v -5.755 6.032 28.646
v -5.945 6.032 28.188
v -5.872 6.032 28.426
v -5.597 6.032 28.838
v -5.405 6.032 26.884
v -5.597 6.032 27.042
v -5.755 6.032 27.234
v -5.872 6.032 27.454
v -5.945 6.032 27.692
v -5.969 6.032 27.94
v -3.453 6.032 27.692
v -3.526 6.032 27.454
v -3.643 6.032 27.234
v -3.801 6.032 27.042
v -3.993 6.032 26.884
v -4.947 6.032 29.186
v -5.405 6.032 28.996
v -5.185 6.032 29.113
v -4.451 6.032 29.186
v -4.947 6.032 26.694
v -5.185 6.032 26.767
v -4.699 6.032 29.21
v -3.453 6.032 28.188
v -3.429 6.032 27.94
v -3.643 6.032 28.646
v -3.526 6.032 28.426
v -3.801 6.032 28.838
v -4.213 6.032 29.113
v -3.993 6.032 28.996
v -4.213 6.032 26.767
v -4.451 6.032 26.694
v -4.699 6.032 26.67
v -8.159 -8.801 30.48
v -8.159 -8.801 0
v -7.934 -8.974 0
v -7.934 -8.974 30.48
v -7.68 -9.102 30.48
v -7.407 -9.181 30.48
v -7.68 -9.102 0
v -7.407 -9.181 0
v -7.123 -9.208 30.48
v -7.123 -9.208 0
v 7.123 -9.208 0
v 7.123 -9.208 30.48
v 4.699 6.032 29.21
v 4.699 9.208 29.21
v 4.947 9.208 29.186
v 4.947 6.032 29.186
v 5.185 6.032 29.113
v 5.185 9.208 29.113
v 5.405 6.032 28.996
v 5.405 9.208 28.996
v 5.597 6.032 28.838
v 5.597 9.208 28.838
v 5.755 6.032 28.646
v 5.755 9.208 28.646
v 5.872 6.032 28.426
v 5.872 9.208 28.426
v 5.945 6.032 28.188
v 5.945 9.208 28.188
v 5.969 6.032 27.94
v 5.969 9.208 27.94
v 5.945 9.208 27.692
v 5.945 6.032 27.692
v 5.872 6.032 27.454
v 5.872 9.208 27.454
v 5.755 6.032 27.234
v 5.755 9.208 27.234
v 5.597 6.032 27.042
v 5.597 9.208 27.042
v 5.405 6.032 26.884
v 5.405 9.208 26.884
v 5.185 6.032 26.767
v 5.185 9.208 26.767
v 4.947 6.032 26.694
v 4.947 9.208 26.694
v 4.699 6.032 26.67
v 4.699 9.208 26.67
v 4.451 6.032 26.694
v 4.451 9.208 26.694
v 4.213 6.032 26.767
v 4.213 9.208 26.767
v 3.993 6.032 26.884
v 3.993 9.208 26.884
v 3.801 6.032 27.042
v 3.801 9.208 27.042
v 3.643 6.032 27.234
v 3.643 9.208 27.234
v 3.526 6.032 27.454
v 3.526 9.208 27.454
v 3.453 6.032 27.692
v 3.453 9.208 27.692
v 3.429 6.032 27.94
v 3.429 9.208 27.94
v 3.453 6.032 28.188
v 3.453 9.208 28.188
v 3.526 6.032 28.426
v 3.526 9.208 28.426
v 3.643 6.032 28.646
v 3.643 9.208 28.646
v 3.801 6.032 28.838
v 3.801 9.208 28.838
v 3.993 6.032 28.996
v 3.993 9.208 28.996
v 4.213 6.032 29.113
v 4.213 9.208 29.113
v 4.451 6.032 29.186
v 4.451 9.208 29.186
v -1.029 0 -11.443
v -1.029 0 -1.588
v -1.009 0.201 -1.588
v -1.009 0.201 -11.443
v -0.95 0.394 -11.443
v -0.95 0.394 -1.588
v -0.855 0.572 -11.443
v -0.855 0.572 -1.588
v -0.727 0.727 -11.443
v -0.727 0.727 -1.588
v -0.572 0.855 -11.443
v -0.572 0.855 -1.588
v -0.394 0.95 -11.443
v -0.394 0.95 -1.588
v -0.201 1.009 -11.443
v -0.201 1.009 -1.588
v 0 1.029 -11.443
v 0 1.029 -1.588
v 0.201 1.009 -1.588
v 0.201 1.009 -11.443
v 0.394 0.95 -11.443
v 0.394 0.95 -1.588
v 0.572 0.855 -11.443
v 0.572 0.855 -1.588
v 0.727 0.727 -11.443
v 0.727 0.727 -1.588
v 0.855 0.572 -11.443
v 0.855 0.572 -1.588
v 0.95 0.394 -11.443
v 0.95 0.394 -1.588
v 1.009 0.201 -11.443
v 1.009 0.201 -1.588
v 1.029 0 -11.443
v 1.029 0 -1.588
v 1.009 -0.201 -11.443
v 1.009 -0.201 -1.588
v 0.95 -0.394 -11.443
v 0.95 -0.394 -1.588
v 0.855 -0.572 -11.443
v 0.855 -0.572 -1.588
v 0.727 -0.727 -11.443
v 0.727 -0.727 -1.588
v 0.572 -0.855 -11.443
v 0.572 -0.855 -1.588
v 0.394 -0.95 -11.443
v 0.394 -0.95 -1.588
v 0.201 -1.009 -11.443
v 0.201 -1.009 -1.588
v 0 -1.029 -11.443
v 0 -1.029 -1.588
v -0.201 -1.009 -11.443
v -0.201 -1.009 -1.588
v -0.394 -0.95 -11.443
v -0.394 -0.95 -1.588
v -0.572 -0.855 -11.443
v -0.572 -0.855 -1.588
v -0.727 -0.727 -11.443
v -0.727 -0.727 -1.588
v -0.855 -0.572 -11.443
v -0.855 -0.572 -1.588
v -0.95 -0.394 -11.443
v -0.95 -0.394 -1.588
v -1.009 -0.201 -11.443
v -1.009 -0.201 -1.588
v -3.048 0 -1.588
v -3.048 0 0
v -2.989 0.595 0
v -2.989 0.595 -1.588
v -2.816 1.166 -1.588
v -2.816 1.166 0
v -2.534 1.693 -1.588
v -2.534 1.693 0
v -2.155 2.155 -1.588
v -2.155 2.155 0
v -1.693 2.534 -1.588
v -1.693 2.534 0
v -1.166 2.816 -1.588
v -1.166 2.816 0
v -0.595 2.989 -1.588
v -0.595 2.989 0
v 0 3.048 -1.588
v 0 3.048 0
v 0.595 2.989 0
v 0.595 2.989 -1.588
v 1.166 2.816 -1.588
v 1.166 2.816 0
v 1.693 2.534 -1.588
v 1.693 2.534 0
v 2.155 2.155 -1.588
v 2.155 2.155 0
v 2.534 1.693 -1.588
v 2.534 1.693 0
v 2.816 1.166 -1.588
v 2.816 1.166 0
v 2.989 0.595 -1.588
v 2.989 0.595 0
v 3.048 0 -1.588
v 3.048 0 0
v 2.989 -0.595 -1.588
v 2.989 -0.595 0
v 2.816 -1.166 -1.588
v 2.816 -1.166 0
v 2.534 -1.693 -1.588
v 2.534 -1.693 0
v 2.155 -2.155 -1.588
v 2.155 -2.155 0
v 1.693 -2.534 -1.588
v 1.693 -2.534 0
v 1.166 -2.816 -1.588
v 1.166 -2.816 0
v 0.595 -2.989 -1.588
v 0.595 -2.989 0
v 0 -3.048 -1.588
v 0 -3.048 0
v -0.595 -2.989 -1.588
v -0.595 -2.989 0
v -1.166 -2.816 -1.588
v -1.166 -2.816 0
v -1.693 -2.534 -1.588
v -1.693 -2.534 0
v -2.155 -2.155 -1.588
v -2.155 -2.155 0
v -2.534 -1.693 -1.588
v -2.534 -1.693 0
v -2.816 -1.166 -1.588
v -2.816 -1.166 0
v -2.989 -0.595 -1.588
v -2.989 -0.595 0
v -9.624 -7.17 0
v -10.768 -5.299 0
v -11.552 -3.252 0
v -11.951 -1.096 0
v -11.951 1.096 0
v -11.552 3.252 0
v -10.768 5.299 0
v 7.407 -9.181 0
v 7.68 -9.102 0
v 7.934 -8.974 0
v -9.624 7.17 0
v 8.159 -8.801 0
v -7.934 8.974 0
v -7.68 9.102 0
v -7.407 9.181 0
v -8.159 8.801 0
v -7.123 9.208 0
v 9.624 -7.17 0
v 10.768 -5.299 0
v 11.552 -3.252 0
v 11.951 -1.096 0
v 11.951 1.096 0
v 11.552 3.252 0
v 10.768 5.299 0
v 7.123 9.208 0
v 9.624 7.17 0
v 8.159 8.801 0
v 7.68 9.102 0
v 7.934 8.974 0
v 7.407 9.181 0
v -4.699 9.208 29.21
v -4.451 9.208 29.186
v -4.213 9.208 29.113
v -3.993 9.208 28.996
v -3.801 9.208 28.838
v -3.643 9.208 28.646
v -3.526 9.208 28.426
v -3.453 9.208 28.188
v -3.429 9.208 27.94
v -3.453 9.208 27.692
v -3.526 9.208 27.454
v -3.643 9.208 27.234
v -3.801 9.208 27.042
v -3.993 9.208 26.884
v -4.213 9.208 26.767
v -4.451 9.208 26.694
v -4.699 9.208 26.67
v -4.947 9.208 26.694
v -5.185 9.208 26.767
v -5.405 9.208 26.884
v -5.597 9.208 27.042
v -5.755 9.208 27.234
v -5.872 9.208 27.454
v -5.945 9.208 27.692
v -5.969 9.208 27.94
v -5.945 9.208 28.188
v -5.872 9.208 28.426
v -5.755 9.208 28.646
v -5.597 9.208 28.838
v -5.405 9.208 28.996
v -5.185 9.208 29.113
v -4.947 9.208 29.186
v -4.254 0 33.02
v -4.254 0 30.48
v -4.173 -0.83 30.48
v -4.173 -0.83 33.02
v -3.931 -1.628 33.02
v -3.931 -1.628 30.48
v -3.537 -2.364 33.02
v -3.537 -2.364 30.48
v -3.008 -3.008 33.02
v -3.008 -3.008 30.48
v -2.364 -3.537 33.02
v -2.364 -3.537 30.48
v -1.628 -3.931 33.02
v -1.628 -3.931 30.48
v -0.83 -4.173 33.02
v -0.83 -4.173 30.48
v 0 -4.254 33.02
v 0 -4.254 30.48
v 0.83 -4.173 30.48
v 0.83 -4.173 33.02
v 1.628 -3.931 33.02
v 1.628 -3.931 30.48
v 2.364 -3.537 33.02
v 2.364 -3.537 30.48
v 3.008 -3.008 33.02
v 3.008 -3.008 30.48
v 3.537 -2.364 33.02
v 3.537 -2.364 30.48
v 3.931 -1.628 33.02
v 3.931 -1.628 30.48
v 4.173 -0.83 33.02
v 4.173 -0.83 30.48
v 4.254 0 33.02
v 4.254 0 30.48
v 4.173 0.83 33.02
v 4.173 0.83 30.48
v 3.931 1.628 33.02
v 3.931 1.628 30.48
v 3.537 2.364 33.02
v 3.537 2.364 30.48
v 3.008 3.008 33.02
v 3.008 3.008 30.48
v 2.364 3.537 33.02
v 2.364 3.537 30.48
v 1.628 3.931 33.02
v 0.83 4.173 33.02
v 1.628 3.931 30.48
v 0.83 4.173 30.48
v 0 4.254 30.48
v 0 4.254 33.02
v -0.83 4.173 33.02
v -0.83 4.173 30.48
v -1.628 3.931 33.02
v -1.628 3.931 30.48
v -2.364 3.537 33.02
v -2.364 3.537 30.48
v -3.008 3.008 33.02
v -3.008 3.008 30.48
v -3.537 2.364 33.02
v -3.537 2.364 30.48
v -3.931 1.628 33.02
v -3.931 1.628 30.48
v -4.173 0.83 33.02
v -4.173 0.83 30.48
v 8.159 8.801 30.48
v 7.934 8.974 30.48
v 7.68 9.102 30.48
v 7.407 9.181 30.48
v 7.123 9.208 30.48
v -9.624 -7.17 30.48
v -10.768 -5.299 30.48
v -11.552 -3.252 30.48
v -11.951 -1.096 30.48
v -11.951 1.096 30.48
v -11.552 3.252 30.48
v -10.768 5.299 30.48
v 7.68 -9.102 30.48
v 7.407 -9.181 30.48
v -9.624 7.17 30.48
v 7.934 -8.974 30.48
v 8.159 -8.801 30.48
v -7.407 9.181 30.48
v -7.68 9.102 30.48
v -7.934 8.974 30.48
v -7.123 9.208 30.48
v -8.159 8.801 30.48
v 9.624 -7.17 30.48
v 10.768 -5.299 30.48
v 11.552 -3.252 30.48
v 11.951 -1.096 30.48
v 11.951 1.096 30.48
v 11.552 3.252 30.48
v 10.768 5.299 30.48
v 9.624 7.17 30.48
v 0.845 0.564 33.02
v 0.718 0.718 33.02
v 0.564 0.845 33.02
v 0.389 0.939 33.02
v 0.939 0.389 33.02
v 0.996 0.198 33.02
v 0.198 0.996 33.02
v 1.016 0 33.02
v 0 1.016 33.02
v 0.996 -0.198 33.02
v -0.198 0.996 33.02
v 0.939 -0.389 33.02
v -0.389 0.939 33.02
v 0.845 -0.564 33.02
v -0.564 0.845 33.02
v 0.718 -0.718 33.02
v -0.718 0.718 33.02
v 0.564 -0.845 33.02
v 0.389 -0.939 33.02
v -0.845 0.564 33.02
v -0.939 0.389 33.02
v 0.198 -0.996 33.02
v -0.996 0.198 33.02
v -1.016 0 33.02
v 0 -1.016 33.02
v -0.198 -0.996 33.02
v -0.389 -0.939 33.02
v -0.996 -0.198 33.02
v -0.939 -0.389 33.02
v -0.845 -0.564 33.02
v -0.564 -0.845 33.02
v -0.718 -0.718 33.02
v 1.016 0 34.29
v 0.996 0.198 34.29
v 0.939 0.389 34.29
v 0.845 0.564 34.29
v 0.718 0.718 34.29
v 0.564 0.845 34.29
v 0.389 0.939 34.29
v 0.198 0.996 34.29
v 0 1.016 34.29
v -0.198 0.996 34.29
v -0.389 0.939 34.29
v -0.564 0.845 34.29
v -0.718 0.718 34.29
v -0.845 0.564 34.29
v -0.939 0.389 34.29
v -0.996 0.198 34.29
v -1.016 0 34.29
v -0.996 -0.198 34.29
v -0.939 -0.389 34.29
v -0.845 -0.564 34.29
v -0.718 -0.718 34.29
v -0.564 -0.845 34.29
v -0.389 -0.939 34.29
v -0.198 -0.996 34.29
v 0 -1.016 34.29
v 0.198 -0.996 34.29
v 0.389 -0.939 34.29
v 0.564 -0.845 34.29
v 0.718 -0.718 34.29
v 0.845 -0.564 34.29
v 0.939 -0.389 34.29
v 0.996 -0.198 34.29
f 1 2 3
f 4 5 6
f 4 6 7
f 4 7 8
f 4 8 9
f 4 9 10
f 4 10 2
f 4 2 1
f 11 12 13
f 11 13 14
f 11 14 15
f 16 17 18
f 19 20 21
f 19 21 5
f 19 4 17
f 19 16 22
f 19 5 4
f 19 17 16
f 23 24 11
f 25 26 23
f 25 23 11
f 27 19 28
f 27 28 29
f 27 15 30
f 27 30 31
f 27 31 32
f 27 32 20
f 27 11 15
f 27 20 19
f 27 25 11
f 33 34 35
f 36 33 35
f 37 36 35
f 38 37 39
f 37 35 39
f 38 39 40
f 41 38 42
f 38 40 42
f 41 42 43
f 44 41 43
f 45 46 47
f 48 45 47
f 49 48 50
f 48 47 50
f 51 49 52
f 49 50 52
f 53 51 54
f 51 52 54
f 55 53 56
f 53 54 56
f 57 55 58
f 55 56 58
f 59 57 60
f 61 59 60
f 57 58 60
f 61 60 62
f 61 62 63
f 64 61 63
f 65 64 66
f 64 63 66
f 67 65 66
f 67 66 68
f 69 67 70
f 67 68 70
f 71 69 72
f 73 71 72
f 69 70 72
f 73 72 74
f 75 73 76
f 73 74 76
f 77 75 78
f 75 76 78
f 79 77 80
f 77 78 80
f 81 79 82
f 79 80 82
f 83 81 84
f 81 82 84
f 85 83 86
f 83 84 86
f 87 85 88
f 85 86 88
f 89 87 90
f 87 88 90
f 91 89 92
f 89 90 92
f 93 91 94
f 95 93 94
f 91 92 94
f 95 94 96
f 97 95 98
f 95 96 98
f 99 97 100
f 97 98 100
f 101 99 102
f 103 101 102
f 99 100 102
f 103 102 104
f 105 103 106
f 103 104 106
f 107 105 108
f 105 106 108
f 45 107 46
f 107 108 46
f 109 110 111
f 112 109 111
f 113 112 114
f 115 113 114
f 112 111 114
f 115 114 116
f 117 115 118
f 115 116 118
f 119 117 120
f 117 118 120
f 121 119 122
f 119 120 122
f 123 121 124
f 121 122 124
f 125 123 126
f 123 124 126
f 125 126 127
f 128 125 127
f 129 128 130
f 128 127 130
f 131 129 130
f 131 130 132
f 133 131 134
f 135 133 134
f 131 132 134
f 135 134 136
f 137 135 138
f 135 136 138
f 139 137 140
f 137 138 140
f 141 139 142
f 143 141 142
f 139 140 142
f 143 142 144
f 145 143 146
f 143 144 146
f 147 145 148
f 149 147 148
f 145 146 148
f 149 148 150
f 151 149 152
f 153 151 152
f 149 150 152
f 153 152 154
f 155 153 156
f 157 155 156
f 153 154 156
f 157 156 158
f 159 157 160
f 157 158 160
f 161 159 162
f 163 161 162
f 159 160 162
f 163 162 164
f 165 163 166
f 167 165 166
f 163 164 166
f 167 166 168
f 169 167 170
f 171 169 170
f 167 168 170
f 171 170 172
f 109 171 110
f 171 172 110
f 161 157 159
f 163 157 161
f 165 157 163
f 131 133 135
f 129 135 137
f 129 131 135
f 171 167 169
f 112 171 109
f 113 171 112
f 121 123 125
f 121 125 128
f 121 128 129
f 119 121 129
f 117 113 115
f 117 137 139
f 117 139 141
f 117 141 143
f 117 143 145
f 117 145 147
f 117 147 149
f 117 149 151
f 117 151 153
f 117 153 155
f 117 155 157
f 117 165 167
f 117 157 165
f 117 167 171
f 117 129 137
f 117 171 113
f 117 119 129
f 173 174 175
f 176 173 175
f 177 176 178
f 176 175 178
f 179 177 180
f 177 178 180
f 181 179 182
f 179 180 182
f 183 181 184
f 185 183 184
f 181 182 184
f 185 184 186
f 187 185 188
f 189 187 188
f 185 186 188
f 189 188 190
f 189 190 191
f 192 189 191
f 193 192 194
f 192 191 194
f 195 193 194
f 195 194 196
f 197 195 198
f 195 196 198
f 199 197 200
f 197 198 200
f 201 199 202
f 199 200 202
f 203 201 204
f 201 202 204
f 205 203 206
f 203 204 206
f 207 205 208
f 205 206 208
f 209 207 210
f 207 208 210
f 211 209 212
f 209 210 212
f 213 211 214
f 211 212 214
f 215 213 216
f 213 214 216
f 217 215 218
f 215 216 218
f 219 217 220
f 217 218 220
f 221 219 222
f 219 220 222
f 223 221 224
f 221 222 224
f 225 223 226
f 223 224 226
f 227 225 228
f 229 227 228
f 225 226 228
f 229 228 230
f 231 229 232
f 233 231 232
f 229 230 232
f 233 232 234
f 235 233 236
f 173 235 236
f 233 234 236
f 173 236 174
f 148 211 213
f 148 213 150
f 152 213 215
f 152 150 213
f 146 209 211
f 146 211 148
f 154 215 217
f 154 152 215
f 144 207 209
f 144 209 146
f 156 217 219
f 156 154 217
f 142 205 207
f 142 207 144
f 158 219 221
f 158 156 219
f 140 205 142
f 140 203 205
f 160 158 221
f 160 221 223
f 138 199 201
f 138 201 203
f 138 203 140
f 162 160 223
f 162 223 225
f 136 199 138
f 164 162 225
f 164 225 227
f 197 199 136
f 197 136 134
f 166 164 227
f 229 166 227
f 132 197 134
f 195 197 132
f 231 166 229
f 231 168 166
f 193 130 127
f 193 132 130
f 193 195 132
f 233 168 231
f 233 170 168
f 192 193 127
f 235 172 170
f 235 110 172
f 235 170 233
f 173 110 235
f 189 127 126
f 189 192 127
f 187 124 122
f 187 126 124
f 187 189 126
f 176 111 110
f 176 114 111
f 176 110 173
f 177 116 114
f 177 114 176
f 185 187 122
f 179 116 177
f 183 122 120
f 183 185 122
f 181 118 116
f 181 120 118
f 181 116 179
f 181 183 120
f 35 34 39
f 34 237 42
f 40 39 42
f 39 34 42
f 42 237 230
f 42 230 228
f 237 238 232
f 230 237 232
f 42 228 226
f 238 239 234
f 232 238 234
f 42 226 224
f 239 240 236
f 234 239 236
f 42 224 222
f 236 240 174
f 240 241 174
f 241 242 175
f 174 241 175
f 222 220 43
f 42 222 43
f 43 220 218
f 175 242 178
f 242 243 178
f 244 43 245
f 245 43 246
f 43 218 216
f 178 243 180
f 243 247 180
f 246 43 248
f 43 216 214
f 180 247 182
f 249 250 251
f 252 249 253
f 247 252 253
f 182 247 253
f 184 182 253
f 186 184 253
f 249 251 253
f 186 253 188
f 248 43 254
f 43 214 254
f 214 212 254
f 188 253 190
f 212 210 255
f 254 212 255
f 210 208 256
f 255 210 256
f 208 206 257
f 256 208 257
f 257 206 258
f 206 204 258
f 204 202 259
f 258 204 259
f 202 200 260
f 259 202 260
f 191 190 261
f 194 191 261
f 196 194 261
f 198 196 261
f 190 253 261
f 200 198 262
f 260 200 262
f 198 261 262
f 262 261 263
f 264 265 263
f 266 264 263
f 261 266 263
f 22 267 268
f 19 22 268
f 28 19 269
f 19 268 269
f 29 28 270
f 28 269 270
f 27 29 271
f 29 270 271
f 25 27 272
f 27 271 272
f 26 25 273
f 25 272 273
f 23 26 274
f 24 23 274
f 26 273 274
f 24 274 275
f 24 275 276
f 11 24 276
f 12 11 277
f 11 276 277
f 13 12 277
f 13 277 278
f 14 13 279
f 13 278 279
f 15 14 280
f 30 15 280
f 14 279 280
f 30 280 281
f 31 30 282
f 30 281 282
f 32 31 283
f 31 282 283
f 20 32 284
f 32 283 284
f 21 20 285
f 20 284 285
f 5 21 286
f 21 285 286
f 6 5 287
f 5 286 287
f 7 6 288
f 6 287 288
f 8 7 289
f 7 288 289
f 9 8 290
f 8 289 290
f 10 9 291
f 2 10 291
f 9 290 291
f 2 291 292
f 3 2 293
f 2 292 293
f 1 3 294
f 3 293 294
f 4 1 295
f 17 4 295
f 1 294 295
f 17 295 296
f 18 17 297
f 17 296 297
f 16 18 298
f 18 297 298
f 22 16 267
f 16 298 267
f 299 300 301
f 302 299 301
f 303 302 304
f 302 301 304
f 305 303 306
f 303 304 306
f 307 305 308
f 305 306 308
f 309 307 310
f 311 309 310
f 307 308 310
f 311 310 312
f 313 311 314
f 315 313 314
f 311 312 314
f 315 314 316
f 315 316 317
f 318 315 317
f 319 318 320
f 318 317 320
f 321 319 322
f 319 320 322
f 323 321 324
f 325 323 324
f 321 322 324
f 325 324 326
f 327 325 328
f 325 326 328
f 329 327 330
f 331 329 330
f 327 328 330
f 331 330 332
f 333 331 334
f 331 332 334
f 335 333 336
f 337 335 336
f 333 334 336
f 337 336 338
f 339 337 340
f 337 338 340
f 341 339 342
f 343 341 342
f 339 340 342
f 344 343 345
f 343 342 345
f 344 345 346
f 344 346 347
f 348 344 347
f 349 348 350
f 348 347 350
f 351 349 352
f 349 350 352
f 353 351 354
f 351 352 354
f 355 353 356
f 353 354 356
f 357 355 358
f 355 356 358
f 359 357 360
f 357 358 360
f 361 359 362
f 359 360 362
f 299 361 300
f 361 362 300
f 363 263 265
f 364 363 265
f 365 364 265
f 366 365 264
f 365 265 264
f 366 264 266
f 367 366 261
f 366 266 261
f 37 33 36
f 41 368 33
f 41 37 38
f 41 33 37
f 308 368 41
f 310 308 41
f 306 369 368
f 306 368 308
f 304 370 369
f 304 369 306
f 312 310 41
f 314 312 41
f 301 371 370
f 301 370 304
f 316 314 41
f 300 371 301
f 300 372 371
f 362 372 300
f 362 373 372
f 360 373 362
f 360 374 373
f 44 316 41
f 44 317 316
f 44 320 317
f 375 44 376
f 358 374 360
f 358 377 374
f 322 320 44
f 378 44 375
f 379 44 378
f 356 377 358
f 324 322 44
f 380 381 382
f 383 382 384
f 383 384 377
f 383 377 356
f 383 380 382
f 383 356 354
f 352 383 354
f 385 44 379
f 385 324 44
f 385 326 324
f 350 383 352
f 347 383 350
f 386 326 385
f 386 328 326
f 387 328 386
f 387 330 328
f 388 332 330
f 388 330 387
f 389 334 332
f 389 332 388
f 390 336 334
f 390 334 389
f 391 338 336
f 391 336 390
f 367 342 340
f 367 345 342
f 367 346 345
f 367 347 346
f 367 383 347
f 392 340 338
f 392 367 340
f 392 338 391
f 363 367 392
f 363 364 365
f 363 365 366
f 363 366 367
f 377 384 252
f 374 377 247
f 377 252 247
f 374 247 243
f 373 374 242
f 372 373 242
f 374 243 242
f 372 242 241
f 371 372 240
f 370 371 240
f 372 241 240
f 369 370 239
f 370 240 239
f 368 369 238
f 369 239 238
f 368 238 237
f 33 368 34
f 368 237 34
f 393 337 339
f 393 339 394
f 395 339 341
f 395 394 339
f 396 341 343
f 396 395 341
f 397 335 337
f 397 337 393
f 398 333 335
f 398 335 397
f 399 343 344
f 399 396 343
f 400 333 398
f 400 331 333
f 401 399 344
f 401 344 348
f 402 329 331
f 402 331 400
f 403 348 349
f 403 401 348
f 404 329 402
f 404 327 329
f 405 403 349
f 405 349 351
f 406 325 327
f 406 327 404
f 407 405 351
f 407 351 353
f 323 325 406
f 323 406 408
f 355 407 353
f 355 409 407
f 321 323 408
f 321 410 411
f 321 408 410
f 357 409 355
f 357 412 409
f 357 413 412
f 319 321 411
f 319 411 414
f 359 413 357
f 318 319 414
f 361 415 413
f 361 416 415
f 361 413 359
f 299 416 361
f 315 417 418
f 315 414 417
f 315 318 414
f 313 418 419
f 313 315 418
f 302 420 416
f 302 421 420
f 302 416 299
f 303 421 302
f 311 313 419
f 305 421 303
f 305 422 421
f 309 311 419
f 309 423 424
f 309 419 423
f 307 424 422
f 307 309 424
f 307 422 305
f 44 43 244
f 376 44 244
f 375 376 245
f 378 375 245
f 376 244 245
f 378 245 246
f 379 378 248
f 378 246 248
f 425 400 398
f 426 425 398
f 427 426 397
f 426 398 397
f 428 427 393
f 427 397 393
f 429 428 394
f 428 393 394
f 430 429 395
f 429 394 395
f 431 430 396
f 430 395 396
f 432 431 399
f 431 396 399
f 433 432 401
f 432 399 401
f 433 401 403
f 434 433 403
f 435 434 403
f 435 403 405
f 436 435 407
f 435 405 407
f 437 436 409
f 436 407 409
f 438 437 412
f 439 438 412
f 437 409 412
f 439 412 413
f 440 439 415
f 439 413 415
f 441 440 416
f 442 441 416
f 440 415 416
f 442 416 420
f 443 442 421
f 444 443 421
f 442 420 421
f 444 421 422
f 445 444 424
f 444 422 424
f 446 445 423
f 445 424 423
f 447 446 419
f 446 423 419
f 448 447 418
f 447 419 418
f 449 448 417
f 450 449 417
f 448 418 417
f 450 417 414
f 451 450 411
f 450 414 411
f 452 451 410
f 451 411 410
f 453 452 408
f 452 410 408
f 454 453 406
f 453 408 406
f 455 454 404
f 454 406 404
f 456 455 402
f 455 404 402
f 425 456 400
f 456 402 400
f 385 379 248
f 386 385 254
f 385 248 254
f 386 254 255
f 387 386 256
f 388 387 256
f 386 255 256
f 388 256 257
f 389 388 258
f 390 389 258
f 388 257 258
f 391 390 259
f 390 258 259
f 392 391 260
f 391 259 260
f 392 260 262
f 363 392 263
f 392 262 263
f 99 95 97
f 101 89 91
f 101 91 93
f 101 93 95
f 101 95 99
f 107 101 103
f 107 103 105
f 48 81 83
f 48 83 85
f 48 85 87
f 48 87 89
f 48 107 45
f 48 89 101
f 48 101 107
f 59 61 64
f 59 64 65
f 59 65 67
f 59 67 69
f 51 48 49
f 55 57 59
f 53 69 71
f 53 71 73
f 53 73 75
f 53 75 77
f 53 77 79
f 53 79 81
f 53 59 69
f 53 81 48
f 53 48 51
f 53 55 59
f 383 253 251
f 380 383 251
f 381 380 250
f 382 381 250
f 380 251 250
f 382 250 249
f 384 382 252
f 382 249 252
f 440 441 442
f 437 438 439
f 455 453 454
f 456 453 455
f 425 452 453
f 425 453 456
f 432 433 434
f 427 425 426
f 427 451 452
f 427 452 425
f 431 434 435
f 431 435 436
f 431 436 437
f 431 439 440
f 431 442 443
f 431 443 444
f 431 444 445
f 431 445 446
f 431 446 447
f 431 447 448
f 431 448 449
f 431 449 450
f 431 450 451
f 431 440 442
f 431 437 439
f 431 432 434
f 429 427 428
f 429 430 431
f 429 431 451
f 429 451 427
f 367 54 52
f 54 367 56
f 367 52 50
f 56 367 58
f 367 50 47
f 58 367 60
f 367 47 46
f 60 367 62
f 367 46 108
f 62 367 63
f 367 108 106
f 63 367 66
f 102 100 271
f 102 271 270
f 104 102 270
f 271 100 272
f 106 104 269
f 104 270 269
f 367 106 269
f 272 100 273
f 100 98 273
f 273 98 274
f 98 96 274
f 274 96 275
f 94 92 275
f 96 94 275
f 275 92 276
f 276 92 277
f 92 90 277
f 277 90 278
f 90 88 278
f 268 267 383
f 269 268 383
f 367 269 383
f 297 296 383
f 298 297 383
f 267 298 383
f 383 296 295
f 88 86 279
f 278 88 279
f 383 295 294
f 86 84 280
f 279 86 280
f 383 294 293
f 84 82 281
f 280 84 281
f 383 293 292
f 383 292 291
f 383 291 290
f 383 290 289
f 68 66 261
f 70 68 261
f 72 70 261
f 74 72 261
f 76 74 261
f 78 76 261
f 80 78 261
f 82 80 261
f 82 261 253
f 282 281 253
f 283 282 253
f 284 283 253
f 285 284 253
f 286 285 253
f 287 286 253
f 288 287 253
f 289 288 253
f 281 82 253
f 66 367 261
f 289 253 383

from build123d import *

# Parameters (mm, degrees)
BOSS_EXTRUDE1_DEPTH = 30.48
SKETCH2_R           = 4.2545
BOSS_EXTRUDE2_DEPTH = 2.54
SKETCH3_R           = 1.016
BOSS_EXTRUDE3_DEPTH = 1.27
SKETCH4_R           = 3.048
BOSS_EXTRUDE4_DEPTH = 1.5875
SKETCH5_R           = 1.0287
BOSS_EXTRUDE5_DEPTH = 9.8552
SKETCH6_R           = 1.27
CUT_EXTRUDE1_DEPTH  = 3.175


with BuildPart() as part:
    # Sketch1 → Boss-Extrude1 (new body)
    with BuildSketch(Plane.XY):
        with BuildLine():
            Line((-7.12333026, -9.2075), (7.12333026, -9.2075))
            ThreePointArc((7.12333026, -9.2075), (7.679816379, -9.102266788), (8.159451026, -8.8011))
            ThreePointArc((8.159451026, -8.8011), (12.0015, 0), (8.159451026, 8.8011))
            ThreePointArc((8.159451026, 8.8011), (7.679816379, 9.102266788), (7.12333026, 9.2075))
            Line((7.12333026, 9.2075), (-7.12333026, 9.2075))
            ThreePointArc((-7.12333026, 9.2075), (-7.679816379, 9.102266788), (-8.159451026, 8.8011))
            ThreePointArc((-8.159451026, 8.8011), (-12.0015, 0), (-8.159451026, -8.8011))
            ThreePointArc((-8.159451026, -8.8011), (-7.679816379, -9.102266788), (-7.12333026, -9.2075))
        make_face()
    extrude(amount=BOSS_EXTRUDE1_DEPTH)

    # Sketch2 → Boss-Extrude2 (add)
    with BuildSketch(Plane.XY.offset(30.48)):
        with Locations(Location((0, 0, 0), (0, 0, 180))):  # turned: the seam where the file's is
            Circle(SKETCH2_R)
    extrude(amount=BOSS_EXTRUDE2_DEPTH)

    # Sketch3 → Boss-Extrude3 (add)
    with BuildSketch(Plane.XY.offset(33.02)):
        Circle(SKETCH3_R)
    extrude(amount=BOSS_EXTRUDE3_DEPTH)

    # Sketch4 → Boss-Extrude4 (add)
    with BuildSketch(Plane(origin=(0, 0, 0), x_dir=(-1, 0, 0), z_dir=(0, 0, -1))):
        Circle(SKETCH4_R)
    extrude(amount=BOSS_EXTRUDE4_DEPTH)

    # Sketch5 → Boss-Extrude5 (add)
    with BuildSketch(Plane(origin=(0, 0, -1.5875), x_dir=(-1, 0, 0), z_dir=(0, 0, -1))):
        Circle(SKETCH5_R)
    extrude(amount=BOSS_EXTRUDE5_DEPTH)

    # Sketch6 → Cut-Extrude1 (cut)
    with BuildSketch(Plane(origin=(0, 9.2075, 0), x_dir=(1, 0, 0), z_dir=(0, 1, 0))):
        with Locations(Location((4.699, -27.94, 0), (0, 0, 270))):  # turned: the seam where the file's is
            Circle(SKETCH6_R)
        with Locations(Location((-4.699, -27.94, 0), (0, 0, 270))):  # turned: the seam where the file's is
            Circle(SKETCH6_R)
    extrude(amount=-CUT_EXTRUDE1_DEPTH, mode=Mode.SUBTRACT)


solid = part.part
